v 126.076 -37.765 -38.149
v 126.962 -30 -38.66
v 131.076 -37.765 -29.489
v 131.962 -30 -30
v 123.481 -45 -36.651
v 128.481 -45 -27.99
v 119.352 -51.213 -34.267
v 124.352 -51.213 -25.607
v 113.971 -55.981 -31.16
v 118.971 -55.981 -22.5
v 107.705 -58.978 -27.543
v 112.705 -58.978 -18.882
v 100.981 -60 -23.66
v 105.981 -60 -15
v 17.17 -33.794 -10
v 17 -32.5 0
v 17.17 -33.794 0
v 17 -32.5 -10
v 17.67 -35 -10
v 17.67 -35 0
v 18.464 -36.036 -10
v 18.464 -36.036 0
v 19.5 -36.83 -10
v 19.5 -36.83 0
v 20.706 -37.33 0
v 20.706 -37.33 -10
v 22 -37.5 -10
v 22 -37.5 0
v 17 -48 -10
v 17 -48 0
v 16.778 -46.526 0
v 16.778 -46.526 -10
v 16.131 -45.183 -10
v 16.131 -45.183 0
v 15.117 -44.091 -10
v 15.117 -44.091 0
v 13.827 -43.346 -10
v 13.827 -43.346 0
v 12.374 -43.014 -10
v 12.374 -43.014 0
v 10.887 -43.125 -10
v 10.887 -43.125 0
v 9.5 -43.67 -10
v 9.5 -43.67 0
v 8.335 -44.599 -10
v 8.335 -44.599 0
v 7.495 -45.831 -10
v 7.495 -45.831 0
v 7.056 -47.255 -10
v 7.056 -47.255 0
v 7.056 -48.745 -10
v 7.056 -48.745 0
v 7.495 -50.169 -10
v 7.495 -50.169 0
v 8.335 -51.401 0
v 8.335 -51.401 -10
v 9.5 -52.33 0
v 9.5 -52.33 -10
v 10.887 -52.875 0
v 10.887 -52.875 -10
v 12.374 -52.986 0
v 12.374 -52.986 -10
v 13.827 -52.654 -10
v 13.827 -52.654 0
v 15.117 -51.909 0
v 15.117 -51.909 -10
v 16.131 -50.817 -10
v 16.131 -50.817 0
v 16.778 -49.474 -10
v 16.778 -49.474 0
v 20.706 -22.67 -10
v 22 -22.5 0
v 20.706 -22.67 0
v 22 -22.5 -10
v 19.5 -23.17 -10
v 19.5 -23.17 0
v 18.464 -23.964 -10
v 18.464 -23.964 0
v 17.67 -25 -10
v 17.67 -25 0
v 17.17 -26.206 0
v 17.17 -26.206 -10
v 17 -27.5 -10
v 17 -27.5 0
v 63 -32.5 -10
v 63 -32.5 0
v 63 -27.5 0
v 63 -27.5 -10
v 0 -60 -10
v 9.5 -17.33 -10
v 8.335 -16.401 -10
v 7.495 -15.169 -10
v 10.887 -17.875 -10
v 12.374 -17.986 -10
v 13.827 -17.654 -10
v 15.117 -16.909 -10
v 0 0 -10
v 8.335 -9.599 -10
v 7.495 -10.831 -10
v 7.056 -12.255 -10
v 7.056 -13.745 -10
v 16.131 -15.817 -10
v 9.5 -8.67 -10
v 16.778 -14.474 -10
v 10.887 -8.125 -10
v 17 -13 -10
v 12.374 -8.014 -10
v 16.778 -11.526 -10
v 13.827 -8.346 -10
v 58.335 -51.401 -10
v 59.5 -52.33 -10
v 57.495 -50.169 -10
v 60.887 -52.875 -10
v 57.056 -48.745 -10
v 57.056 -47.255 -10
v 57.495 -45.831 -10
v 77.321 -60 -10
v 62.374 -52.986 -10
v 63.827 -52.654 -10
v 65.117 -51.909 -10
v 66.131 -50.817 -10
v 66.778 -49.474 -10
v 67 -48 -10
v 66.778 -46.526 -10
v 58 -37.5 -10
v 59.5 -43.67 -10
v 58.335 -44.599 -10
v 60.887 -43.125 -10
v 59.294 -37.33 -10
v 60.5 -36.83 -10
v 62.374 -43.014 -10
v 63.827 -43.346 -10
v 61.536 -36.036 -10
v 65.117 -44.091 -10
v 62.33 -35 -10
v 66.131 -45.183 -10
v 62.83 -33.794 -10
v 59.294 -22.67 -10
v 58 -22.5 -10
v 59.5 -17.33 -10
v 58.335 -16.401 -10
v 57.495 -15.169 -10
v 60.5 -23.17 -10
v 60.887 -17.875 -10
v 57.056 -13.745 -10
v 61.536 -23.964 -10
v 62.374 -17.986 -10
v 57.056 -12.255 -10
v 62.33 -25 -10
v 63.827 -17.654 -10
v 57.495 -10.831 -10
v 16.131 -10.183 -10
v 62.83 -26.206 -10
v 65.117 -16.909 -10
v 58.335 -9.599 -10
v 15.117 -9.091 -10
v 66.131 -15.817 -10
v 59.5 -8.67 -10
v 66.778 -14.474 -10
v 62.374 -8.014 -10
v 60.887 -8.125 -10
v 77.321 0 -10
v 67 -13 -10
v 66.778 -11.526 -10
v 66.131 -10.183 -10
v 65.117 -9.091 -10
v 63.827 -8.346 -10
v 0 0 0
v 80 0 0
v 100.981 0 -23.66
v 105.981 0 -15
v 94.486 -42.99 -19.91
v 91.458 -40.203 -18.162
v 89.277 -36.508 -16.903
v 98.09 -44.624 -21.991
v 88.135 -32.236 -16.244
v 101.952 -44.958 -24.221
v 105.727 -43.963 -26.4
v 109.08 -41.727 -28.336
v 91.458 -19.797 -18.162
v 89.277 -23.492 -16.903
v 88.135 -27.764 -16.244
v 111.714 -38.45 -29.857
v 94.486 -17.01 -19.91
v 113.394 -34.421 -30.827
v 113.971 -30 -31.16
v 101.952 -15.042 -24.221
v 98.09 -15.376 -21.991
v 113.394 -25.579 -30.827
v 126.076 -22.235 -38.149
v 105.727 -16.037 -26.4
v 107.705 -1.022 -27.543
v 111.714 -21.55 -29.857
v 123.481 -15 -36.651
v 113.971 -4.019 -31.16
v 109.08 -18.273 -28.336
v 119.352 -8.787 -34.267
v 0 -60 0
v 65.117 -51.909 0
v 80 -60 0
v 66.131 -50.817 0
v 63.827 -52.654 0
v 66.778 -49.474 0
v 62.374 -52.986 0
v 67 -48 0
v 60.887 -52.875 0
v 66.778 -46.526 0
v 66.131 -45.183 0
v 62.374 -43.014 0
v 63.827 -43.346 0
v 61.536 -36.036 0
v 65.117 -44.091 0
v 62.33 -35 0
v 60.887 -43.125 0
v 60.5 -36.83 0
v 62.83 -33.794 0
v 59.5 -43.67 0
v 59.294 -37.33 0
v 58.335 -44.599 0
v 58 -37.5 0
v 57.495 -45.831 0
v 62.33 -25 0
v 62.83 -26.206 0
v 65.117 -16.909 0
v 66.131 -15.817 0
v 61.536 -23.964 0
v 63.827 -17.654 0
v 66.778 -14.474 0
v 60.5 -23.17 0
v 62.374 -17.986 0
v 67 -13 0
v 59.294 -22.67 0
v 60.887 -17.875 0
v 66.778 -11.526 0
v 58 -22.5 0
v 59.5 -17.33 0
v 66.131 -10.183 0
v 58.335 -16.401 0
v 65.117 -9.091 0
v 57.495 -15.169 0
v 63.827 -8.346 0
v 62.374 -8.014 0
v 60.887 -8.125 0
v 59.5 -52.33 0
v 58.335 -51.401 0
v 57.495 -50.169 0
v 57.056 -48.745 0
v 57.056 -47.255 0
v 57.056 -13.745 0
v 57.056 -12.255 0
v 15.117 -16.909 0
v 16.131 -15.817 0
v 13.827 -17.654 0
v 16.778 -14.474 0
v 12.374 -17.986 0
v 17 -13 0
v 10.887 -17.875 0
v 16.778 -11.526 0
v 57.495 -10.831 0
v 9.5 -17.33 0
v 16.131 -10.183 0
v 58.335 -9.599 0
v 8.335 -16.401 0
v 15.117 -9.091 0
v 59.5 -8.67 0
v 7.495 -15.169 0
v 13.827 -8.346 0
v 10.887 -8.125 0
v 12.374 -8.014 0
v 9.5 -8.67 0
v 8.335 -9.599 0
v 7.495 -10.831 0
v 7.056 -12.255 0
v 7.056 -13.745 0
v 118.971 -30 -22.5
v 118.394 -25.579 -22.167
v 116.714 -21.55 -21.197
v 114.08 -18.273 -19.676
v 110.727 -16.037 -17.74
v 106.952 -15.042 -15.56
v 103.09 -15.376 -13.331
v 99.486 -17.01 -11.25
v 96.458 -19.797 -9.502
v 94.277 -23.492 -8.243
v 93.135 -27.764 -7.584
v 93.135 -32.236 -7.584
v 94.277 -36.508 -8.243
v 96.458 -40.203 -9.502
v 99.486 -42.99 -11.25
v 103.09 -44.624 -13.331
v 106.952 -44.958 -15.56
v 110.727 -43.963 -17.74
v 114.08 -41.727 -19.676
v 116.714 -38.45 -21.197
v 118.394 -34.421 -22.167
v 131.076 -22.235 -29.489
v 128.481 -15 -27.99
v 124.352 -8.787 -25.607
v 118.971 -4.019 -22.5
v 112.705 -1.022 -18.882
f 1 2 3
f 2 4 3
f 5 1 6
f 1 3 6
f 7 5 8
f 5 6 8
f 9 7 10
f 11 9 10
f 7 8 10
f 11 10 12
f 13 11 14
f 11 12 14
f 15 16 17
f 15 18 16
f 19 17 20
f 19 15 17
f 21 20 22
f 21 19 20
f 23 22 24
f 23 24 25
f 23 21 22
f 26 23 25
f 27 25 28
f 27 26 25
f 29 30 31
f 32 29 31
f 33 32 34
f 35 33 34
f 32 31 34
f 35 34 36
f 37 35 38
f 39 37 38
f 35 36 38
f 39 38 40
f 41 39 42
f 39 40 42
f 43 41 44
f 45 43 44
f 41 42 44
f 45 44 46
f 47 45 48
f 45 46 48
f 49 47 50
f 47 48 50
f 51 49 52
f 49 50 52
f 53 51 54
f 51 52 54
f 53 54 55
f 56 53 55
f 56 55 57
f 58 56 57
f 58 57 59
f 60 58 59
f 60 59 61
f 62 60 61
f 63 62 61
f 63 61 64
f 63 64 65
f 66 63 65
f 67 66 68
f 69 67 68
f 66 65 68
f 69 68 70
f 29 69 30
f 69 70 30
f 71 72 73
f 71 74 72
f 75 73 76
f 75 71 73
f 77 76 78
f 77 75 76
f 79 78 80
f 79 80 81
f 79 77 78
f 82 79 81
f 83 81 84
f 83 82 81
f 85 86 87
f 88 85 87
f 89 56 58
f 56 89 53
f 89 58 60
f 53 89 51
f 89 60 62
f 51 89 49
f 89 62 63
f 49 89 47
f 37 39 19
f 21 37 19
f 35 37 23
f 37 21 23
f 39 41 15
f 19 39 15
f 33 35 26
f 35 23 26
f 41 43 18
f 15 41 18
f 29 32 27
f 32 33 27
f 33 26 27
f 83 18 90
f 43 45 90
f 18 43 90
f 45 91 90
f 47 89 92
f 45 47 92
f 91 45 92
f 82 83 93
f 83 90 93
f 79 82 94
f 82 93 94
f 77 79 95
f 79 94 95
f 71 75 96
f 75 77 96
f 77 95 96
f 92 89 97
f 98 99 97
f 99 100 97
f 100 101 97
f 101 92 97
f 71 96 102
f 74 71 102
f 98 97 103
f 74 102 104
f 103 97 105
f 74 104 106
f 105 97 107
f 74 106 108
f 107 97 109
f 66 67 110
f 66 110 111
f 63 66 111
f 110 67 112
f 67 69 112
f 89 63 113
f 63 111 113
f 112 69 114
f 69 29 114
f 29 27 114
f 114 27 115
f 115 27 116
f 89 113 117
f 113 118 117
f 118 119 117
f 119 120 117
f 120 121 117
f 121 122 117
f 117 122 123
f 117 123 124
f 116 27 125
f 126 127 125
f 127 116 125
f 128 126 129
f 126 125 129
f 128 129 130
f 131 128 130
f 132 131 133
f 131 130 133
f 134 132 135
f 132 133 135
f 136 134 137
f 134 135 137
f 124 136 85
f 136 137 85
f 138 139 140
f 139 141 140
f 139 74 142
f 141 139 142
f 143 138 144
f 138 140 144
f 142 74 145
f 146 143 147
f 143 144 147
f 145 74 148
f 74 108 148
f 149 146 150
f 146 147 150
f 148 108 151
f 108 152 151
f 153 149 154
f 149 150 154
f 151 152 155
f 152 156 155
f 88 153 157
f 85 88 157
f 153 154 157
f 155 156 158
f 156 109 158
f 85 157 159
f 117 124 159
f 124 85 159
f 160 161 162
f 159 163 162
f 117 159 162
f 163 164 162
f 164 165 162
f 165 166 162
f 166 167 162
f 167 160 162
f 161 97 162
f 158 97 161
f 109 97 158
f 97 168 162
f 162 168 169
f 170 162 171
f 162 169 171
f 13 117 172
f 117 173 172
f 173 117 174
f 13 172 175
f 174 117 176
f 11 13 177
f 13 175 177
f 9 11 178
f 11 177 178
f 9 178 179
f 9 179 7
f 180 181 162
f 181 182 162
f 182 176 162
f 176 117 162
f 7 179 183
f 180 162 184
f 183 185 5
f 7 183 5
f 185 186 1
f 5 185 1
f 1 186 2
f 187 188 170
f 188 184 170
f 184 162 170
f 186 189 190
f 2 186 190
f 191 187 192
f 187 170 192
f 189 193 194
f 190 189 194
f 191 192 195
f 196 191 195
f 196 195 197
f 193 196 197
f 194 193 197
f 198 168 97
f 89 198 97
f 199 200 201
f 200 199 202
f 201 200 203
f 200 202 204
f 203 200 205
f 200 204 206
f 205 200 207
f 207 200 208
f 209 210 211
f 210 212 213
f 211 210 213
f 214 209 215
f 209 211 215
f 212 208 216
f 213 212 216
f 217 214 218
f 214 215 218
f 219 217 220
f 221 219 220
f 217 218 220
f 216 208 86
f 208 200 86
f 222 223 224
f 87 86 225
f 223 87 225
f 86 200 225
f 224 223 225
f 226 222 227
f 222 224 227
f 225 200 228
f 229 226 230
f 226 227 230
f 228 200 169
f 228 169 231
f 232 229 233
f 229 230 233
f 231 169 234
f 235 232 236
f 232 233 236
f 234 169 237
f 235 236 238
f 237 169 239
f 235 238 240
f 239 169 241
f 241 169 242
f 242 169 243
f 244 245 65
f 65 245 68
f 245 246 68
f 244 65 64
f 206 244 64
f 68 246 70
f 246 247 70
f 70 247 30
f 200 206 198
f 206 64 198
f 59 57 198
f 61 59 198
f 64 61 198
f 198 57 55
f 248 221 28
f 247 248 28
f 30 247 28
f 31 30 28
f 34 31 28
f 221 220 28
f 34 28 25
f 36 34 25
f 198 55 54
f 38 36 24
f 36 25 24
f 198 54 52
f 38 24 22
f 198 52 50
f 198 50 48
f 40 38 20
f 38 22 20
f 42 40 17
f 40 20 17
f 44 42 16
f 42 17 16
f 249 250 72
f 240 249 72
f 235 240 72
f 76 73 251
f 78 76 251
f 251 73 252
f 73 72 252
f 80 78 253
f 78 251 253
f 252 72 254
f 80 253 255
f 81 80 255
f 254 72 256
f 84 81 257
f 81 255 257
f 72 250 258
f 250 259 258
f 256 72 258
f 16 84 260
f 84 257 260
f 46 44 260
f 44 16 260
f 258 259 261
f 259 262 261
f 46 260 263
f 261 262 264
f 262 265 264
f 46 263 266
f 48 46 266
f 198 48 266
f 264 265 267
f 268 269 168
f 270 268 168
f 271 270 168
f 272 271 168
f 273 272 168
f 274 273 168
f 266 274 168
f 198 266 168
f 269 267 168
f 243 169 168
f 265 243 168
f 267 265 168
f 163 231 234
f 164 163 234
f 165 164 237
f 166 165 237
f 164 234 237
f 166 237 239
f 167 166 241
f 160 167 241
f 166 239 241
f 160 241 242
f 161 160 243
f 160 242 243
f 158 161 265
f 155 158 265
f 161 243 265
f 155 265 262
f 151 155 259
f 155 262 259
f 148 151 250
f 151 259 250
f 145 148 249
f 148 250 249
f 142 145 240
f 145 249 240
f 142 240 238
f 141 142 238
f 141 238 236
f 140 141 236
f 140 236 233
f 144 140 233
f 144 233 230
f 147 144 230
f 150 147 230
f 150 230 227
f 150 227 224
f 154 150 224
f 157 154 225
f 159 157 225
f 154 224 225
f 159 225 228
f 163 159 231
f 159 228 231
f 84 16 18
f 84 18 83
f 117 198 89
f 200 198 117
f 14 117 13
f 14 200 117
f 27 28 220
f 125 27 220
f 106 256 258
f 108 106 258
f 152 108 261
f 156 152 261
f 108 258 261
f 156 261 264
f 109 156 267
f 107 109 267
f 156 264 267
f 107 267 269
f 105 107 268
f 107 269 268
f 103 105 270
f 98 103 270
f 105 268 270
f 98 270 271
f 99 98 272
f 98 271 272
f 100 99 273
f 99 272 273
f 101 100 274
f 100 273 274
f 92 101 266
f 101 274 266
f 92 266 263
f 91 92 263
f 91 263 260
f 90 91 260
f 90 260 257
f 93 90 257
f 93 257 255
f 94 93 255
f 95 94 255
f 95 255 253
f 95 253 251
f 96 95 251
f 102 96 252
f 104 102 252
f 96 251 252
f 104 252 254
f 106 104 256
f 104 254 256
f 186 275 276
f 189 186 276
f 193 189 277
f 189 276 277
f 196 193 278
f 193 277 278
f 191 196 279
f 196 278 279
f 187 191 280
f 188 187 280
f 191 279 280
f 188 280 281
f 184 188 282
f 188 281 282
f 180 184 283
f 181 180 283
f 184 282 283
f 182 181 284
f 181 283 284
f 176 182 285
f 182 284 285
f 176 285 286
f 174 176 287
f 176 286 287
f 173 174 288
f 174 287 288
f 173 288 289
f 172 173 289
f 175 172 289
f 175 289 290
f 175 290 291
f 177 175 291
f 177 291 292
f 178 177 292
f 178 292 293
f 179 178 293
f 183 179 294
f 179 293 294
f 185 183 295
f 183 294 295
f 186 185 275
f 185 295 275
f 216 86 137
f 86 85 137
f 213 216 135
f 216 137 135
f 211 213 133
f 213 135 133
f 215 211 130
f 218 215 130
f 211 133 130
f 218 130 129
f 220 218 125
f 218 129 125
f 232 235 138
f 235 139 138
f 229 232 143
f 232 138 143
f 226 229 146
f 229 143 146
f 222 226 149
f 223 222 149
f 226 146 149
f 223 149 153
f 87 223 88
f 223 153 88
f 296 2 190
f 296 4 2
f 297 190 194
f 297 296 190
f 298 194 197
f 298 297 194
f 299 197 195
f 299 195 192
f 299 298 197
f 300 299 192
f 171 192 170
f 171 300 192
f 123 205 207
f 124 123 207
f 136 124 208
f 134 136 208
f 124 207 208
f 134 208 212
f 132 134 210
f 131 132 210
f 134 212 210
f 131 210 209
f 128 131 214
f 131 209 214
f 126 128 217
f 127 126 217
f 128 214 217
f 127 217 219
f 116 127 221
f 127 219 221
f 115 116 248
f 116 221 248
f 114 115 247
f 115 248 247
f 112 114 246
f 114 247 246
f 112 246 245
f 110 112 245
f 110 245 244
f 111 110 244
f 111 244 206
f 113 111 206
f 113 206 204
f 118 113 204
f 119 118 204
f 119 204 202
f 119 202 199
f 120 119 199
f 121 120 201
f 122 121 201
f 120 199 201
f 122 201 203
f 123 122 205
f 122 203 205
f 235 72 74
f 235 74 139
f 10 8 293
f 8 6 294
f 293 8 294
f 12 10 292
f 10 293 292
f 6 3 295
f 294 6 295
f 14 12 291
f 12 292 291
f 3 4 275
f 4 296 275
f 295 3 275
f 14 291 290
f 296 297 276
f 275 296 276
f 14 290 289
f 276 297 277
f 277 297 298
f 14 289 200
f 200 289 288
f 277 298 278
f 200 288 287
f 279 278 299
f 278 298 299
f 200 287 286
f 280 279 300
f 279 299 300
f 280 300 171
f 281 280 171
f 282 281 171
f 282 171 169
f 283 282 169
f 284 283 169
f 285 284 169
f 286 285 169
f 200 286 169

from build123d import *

# Parameters (mm, degrees)
F1_DEPTH = 60
F2_R     = 29.99999
F3_R     = 15
F4_DEPTH = 10
F5_R     = 5
F6_DEPTH = 10
F7_W     = 46
F7_H     = 15
F8_DEPTH = 10
F9_R     = 5
F10_R    = 5


# Not quite as in the source:
# - a fillet or chamfer is up to 0.001 mm smaller than in the source, because OpenCascade refuses the exact size


with BuildPart() as f1:
    # F0 (on Front) → F1 (new body)
    with BuildSketch(Plane.XZ):
        Polygon((80, 0), (0, 0), (0, -10), (77.3205080757, -10), (126.9615242271, -38.6602540378), (131.9615242271, -30), align=None)
    extrude(amount=F1_DEPTH)

    # F2 (radius 30 in the source; OpenCascade refuses exactly that, so slightly less here)
    f2_edges = [f1.edges().sort_by_distance(p)[0] for p in [
        (129.461524, 0, -34.330127),
        (129.461524, -60, -34.330127),
    ]]
    fillet(f2_edges, radius=F2_R)

    # F3 (on face) → F4 (cut, through all)
    with BuildSketch(Plane(origin=(20, 0, 34.6410161514), x_dir=(0.8660254038, 0, -0.5), z_dir=(0.5, 0, 0.8660254038))):
        with Locations((99.2820323028, -30)):
            Circle(F3_R)
    extrude(amount=-F4_DEPTH, mode=Mode.SUBTRACT)

    # F5 (on face) → F6 (cut, through all)
    with BuildSketch(Plane.XY):
        with Locations((12, -13)):
            Circle(F5_R)
        with Locations((12, -48)):
            Circle(F5_R)
        with Locations((62, -48)):
            Circle(F5_R)
        with Locations((62, -13)):
            Circle(F5_R)
    extrude(amount=-F6_DEPTH, mode=Mode.SUBTRACT)

    # F7 (on face) → F8 (cut, through all)
    with BuildSketch(Plane.XY):
        with Locations((40, -30)):
            Rectangle(F7_W, F7_H)
    extrude(amount=-F8_DEPTH, mode=Mode.SUBTRACT)

    # F9
    f9_edges = [f1.edges().sort_by_distance(p)[0] for p in [
        (17, -22.5, -5),
    ]]
    fillet(f9_edges, radius=F9_R)

    # F10
    f10_edges = [f1.edges().sort_by_distance(p)[0] for p in [
        (63, -22.5, -5),
        (63, -37.5, -5),
        (17, -37.5, -5),
    ]]
    fillet(f10_edges, radius=F10_R)


solid = f1.part
